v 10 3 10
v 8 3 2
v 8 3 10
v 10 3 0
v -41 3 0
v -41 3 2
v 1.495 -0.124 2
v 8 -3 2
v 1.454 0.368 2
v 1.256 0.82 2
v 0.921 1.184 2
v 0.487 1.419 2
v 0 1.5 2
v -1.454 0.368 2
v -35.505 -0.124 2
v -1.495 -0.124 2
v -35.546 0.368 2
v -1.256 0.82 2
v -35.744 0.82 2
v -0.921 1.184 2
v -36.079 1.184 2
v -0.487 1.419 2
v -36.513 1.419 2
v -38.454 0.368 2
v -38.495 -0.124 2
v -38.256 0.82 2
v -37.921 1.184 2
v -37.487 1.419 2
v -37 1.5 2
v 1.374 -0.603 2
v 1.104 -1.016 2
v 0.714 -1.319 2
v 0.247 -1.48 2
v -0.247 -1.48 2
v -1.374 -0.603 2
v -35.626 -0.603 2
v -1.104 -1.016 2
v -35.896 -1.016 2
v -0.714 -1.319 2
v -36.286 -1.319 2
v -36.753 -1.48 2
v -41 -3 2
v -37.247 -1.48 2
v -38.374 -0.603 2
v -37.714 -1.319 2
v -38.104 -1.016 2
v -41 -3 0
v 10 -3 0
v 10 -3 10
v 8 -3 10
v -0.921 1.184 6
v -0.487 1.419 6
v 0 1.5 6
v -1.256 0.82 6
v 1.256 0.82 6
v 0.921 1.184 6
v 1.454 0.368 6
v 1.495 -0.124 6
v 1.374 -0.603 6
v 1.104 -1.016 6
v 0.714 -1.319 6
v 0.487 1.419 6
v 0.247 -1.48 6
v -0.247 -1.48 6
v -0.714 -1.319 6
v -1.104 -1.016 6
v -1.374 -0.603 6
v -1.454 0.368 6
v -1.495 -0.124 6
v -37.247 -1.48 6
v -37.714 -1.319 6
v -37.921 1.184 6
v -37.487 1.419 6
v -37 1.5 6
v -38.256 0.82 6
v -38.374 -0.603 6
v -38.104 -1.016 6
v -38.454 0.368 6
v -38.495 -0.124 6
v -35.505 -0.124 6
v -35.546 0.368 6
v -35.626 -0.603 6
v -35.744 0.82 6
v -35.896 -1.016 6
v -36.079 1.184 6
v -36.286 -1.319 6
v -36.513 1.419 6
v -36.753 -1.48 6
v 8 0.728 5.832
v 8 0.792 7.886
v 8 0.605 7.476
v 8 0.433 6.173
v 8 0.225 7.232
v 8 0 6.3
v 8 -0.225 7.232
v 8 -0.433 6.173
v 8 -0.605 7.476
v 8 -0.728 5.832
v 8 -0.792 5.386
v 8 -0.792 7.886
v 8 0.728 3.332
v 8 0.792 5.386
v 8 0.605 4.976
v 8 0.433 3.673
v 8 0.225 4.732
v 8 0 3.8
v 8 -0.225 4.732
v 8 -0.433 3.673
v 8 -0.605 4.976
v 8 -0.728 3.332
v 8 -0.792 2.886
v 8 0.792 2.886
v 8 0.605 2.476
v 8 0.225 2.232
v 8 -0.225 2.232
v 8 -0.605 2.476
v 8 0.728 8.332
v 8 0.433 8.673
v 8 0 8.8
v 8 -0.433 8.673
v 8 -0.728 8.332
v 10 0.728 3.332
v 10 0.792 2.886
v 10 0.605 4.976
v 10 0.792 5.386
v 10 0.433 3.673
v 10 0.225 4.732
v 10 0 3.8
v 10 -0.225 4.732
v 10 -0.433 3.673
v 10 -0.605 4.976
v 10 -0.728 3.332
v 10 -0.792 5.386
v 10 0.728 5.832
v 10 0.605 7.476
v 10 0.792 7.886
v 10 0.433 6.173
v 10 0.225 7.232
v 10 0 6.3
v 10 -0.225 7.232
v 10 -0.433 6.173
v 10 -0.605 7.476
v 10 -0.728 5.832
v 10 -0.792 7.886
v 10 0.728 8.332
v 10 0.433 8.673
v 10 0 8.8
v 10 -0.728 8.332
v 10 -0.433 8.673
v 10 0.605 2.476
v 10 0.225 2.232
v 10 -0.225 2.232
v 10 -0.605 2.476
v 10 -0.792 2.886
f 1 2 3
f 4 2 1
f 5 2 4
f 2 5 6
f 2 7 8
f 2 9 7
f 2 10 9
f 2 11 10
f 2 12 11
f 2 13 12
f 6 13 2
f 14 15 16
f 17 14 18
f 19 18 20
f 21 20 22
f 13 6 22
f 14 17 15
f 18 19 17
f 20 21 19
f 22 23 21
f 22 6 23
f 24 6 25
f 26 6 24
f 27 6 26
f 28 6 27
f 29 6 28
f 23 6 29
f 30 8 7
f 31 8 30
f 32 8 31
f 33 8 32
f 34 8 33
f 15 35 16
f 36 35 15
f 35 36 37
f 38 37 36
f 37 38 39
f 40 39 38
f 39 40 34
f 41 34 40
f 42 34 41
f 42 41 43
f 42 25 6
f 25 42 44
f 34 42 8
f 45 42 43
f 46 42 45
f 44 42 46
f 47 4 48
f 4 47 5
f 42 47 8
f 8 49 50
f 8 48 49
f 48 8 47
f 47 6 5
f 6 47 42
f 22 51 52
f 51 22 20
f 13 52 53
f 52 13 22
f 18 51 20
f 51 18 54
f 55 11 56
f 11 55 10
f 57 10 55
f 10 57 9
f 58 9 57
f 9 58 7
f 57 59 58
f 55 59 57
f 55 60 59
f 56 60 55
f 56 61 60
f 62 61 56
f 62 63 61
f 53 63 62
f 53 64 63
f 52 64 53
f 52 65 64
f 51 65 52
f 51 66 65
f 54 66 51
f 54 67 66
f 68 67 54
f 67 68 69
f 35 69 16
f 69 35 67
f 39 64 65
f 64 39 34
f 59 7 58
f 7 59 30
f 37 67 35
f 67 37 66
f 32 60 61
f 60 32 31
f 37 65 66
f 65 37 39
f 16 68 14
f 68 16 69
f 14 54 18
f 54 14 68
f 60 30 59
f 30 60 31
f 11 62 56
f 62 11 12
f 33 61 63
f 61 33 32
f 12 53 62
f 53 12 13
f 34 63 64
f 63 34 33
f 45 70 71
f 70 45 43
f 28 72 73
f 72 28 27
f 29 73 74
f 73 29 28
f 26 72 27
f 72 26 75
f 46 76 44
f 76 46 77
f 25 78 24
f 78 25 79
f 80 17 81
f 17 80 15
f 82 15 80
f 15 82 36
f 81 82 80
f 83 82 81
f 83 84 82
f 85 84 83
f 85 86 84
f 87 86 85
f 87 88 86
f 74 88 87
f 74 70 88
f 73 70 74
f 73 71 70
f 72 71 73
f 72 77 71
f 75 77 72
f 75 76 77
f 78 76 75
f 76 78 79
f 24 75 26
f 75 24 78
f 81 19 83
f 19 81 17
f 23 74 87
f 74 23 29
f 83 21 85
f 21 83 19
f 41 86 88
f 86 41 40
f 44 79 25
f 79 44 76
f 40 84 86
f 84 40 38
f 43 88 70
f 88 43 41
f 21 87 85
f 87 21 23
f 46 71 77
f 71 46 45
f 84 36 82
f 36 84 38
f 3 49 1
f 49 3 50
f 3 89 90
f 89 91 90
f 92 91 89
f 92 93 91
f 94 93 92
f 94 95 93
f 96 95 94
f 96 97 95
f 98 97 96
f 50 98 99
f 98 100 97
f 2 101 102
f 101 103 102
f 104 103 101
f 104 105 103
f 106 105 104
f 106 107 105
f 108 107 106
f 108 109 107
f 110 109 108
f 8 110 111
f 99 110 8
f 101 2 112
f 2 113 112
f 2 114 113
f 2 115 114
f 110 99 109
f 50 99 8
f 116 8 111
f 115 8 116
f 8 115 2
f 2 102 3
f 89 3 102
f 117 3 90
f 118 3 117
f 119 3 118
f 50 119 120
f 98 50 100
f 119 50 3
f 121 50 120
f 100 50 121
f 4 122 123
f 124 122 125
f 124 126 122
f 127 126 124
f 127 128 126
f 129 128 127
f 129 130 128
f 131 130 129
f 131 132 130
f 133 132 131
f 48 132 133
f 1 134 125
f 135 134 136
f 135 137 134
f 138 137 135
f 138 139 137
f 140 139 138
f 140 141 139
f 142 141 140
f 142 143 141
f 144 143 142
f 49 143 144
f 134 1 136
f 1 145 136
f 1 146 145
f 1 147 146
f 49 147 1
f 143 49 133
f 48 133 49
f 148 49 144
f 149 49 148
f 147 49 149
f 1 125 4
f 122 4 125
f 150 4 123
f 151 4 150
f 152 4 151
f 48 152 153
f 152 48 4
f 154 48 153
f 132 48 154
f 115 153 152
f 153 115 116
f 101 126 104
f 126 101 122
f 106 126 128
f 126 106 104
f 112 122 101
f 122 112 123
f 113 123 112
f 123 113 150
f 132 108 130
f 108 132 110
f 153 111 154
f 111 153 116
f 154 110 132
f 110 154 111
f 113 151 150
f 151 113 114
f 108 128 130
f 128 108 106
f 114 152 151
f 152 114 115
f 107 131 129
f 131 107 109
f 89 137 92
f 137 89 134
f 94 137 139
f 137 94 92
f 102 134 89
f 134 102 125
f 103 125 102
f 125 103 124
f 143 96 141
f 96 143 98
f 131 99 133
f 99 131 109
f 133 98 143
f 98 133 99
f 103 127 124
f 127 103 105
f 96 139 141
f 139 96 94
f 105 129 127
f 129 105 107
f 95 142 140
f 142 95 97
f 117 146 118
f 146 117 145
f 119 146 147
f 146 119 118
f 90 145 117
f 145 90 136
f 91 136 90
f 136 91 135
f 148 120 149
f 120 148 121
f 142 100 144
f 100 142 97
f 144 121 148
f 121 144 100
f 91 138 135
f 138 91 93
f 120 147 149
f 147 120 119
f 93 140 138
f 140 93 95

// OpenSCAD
$fa=4;
$fs=0.5;

tolerance=0.15;

arm_width = 8;
arm_height = 9;

sensor_w = 35;
sensor_d = 2;
sensor_h1 = 3;
sensor_h2 = 7;

angle = 10;

ir_sensor_mnt_servo();

module ir_sensor_mnt_servo() {
	union() {
		rotate([0,0,90]) mnt();
		translate([3,-3,0]) cube([6,6,2]);
		translate([10,-3,0]) rotate([0,-90,0]) difference(){
			cube([10,6,2]);
			translate([3,3,-0.5]) cylinder(r=0.8,h=3);
			translate([5.5,3,-0.5]) cylinder(r=0.8,h=3);
			translate([8,3,-0.5]) cylinder(r=0.8,h=3);
		}
	}
}

module mnt_servo() {
	union(){
		difference() {
			translate([-17,-6,0]) cube([15,12,2]);
			translate([-15,-4,-1]) cube([13,8,4]);
		}
		translate([-17,0,0.8]) rotate([0,-90,0]) cylinder(r=0.8,h=3);
		translate([-17,-7/2,0.8]) rotate([0,-90,0]) cylinder(r=0.8,h=3);
		translate([-17,7/2,0.8]) rotate([0,-90,0]) cylinder(r=0.8,h=3);
		//grip
		translate([0,-arm_width/2-2,0]) grip(2,4,4+arm_height+2*tolerance,2);
		translate([-2,-arm_width/2-2,0]) cube([2,arm_width+4,2]);
		mirror([0,1,0]) translate([0,-arm_width/2-2,0]) grip(2,4,4+arm_height+2*tolerance,2);
	}
}

module ir_sensor_mnt() {
	union() {
		translate([0,-arm_width/2-2,0]) grip(2,4,4+arm_height+2*tolerance,2);
		translate([-2,-arm_width/2-2,0]) cube([2,arm_width+4,2]);
		mirror([0,1,0]) translate([0,-arm_width/2-2,0]) grip(2,4,4+arm_height+2*tolerance,2);
		translate([-6,0,0]) rotate([0,0,90]) mnt();
	}
}

module mnt() {
	union() {
		translate([-3,-4,0]) cube([6,37+2*4,2]);
		translate([0,0,0]) cylinder(r=1.5,h=2+4);
		translate([0,37,0]) cylinder(r=1.5,h=2+4);
	}
}

module grip(w1, w2, length, height) {
	union() {
		cube([length-w2,w1,height]);
		translate([length-w2,0,0]) intersection() {
			cylinder(r=w2, h=height);
			cube([w2,w2,height]);
		}
	}
}
